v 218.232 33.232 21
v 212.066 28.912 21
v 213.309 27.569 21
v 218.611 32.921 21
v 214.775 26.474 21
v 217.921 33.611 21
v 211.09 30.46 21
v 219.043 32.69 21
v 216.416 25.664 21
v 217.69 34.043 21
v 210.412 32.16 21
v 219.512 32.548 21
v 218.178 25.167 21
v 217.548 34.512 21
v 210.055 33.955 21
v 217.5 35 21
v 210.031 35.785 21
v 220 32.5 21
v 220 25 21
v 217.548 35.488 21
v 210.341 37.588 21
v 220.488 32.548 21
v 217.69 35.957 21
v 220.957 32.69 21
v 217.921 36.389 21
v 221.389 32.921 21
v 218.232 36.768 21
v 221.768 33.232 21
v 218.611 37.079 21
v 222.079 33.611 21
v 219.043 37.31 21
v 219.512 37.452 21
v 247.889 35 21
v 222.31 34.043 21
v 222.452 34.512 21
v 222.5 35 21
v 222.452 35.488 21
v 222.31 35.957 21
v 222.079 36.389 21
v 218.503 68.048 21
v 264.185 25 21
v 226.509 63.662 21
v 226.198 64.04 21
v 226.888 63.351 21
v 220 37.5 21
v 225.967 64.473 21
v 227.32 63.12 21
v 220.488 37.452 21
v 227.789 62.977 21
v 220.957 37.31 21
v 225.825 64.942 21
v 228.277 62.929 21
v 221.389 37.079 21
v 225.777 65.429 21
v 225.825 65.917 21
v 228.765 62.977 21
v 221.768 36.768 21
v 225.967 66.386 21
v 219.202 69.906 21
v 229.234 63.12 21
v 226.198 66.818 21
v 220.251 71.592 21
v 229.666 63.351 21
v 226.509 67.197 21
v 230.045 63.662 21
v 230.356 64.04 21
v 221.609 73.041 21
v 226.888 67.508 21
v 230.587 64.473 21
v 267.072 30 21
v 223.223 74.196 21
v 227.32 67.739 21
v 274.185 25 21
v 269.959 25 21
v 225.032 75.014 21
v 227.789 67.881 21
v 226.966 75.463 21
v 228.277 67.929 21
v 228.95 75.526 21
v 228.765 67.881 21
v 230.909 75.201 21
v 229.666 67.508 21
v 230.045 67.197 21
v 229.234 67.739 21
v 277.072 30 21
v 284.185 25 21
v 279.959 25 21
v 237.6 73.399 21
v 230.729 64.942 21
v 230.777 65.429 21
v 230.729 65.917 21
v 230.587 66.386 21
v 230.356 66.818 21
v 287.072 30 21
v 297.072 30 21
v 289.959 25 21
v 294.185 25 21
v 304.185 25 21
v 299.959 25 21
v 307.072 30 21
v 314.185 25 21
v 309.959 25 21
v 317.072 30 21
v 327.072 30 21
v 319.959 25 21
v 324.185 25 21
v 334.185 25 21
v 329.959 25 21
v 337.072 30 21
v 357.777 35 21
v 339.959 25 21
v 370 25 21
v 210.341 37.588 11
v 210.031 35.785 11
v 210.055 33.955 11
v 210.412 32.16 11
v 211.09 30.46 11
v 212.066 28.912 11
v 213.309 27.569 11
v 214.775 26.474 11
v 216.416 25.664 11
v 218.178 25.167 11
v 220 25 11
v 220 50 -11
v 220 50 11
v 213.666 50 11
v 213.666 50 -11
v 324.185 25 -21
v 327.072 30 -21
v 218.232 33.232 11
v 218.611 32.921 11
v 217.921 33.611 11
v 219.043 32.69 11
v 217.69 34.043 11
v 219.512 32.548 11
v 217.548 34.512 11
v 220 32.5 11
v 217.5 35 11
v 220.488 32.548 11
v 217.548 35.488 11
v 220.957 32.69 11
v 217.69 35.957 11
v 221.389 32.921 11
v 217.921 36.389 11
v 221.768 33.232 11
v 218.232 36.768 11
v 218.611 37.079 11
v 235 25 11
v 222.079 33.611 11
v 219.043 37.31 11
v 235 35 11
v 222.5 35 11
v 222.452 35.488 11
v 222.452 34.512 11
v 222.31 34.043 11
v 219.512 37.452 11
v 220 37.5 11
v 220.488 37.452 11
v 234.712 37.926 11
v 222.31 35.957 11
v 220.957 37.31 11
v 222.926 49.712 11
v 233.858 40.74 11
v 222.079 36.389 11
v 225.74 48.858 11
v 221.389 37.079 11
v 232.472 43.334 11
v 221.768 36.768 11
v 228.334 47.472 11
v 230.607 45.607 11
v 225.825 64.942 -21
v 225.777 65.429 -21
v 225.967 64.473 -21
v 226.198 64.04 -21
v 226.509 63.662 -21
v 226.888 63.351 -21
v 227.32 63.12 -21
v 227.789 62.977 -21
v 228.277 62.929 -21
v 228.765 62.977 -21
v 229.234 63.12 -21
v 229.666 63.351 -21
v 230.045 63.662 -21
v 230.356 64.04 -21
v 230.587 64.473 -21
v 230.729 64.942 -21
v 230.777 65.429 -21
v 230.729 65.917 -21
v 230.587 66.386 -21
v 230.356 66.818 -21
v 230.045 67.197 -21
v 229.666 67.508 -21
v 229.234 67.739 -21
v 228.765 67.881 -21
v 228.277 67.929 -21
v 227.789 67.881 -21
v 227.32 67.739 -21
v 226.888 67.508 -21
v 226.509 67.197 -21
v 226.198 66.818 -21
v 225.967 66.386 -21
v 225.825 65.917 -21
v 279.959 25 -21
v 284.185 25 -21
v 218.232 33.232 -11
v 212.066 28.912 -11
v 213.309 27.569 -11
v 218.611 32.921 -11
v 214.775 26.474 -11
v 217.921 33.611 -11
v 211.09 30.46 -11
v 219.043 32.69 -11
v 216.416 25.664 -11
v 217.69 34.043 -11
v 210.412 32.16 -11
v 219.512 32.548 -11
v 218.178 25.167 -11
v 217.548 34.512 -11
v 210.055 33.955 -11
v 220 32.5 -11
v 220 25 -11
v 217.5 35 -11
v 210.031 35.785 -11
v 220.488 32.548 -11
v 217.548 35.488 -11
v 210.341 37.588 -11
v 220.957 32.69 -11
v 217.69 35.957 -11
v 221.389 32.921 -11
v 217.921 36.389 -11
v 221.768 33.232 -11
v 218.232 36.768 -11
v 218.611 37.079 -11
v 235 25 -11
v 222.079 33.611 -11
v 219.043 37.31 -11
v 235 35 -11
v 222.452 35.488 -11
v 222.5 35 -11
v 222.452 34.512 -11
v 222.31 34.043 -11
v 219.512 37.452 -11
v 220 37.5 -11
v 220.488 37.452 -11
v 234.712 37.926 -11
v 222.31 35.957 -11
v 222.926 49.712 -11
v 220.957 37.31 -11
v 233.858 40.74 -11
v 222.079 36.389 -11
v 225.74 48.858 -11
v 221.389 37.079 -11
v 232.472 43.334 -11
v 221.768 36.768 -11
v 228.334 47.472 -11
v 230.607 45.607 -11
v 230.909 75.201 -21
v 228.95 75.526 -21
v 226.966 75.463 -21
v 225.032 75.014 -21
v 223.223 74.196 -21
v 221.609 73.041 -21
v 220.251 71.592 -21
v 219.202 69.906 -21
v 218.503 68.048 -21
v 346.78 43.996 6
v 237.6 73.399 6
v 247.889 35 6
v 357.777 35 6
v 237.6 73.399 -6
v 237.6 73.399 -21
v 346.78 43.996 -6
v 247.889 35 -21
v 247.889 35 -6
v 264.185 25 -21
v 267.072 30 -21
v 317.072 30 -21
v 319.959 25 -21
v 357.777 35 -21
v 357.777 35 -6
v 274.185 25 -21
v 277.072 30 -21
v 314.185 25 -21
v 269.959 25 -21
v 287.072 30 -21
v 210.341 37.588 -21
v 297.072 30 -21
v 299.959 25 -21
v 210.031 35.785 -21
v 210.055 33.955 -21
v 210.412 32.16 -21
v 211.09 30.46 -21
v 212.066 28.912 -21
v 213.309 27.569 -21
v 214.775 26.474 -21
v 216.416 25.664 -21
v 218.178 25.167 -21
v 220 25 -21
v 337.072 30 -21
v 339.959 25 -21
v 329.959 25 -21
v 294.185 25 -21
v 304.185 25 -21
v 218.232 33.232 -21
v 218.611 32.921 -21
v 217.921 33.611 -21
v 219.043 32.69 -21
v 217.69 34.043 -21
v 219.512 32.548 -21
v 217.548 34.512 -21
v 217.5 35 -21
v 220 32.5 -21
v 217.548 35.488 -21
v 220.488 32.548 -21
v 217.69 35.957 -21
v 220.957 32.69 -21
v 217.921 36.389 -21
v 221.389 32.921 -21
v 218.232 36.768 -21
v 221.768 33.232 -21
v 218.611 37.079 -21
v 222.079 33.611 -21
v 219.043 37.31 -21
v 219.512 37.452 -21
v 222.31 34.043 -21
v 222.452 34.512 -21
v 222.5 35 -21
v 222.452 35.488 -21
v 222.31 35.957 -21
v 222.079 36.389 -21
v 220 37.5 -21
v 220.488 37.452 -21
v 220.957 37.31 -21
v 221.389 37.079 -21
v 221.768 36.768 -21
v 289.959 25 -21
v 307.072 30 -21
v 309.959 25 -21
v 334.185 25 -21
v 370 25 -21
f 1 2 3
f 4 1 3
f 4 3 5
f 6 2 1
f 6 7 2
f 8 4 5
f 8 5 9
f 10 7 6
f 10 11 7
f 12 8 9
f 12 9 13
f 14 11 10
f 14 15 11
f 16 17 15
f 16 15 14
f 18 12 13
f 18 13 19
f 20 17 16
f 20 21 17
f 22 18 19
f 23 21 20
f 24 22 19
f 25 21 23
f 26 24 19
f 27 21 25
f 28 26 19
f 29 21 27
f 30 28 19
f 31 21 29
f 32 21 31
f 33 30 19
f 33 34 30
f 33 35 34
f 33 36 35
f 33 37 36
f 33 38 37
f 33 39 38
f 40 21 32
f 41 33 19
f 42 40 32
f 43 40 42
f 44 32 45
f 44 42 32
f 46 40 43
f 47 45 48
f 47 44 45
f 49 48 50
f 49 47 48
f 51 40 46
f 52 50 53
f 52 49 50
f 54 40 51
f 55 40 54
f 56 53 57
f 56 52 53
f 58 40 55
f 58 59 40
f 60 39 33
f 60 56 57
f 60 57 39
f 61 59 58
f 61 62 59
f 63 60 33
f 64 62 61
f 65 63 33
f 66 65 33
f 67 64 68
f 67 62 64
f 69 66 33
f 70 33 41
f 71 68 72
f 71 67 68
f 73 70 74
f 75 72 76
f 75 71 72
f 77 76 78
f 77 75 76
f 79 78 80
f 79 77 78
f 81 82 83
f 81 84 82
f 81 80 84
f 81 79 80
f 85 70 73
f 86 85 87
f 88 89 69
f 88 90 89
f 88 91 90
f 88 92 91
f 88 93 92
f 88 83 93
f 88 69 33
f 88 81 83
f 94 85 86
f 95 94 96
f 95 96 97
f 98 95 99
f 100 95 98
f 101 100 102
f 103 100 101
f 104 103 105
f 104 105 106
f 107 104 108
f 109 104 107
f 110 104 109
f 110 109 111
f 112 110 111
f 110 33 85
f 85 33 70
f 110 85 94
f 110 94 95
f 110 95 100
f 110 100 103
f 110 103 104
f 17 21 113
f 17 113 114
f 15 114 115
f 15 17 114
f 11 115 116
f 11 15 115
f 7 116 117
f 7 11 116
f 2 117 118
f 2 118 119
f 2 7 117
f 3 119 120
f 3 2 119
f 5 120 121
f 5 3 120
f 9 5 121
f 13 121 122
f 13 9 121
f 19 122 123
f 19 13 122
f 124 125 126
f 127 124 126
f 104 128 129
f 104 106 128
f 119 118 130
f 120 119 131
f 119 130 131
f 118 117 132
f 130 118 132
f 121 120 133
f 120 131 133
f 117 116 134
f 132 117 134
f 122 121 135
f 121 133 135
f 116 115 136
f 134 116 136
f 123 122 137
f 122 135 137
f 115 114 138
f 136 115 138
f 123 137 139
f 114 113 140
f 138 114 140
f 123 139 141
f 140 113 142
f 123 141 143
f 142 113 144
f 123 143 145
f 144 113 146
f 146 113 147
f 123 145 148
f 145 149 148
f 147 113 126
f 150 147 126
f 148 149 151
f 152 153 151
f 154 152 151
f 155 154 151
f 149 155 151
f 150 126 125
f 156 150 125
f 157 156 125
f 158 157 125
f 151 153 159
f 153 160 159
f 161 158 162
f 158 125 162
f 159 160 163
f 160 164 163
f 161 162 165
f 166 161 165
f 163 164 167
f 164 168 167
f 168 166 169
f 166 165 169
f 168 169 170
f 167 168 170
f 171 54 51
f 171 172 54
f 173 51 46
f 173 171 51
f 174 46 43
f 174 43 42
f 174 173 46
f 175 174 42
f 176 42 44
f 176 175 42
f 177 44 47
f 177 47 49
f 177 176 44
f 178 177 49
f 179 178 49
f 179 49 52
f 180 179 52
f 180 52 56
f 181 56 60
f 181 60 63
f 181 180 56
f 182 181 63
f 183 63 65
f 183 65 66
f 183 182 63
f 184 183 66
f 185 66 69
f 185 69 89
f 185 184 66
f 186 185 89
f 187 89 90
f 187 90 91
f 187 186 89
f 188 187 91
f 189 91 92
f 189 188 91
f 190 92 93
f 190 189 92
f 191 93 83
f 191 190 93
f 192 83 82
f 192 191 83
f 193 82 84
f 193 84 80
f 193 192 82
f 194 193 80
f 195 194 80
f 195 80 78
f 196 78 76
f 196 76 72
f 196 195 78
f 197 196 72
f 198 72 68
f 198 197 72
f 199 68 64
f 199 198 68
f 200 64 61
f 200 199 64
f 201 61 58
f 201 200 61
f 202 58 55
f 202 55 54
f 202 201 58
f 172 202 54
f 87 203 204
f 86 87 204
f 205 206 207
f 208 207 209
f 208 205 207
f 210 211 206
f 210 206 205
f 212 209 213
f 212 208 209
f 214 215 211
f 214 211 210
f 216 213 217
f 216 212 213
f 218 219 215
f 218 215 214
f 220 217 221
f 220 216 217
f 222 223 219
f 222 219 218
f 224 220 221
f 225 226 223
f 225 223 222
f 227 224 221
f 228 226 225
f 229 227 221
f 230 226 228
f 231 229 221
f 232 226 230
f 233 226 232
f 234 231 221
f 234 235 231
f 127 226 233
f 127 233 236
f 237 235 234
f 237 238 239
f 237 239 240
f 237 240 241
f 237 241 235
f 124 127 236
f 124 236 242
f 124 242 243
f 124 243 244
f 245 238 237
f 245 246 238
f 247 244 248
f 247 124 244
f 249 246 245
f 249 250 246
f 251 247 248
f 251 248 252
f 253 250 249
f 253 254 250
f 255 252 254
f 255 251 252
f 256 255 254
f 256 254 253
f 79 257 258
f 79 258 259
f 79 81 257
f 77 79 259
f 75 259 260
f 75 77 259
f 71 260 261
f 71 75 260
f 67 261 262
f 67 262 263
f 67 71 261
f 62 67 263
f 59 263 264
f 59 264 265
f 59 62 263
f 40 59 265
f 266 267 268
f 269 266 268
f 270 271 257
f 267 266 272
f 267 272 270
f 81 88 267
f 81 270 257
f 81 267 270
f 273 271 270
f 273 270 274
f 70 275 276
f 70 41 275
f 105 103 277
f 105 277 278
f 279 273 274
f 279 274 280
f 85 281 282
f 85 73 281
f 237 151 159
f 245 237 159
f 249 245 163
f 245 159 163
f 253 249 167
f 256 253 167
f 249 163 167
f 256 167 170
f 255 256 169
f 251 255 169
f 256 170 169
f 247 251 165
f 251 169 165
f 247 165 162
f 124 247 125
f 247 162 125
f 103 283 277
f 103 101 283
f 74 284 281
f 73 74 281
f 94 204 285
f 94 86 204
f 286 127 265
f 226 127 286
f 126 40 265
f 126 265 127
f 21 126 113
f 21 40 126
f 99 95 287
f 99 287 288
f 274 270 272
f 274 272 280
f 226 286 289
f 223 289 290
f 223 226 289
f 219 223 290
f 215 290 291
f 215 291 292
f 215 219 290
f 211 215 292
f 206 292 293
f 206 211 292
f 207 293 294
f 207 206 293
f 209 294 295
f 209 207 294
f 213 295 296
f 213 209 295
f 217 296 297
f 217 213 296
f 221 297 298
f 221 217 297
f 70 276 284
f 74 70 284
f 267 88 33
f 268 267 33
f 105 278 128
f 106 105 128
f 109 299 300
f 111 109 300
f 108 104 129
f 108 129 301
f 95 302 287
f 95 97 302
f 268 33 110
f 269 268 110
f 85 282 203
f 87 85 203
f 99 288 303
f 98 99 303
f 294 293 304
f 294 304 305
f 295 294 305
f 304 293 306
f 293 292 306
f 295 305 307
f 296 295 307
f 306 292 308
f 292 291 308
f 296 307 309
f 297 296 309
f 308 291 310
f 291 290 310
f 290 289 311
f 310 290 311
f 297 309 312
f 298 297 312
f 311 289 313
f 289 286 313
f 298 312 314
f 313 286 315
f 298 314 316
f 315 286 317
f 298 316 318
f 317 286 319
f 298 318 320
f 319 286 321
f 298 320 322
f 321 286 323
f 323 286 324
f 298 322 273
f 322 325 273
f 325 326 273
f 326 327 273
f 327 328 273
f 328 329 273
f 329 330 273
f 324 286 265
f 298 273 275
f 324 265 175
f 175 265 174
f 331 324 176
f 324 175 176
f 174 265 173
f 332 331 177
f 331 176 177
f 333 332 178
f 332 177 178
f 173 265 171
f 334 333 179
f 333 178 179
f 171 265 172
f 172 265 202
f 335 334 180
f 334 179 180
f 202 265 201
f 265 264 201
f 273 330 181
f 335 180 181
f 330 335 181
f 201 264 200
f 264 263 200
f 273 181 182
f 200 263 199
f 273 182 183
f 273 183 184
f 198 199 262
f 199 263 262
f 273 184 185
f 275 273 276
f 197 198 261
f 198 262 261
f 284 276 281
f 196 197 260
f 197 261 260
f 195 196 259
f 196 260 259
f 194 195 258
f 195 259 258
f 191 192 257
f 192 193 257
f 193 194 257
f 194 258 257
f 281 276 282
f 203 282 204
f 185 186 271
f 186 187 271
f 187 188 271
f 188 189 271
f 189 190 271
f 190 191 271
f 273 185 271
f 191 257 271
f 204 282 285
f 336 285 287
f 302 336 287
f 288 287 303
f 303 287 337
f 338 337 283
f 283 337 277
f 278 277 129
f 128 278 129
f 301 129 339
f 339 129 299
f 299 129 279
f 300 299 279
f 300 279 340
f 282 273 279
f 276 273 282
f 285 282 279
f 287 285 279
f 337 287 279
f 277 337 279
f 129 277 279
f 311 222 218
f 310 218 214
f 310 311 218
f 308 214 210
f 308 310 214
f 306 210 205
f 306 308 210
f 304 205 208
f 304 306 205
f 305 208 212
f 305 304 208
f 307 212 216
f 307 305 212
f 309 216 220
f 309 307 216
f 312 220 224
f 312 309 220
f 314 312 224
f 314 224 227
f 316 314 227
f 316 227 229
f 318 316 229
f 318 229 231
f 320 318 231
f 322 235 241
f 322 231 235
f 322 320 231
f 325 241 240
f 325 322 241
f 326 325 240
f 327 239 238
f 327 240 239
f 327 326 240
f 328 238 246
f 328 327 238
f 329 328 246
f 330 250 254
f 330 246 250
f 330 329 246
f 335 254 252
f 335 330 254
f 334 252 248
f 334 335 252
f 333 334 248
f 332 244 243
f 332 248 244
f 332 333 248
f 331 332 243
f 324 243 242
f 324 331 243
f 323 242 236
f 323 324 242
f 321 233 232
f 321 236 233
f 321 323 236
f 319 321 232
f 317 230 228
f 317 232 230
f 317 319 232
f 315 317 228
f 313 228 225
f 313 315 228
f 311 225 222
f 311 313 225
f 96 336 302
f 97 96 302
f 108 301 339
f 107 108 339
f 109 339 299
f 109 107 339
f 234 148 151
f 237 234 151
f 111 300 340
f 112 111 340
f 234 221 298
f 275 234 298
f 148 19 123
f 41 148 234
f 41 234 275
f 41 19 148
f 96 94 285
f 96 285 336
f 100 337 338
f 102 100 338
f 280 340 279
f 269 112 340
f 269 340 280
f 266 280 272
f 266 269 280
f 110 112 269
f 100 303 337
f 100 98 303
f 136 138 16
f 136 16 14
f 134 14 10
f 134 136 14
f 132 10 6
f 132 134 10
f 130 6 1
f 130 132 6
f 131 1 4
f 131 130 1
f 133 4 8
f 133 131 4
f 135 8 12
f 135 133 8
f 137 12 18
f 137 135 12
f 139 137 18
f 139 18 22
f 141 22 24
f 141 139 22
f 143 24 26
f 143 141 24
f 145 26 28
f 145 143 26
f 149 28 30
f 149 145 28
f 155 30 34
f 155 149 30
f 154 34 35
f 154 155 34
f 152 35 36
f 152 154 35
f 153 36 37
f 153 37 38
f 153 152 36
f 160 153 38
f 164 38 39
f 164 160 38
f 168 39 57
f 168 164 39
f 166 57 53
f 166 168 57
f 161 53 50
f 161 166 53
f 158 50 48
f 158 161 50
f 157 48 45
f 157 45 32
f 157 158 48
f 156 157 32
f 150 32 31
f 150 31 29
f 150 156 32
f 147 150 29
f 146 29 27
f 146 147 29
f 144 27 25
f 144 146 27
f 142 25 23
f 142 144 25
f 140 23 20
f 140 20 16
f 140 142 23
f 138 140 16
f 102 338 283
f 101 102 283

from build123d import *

# Parameters (mm, degrees)
SKETCH_1_R             = 2.5
EXTRUDE_1_DEPTH        = 21
CUT_EXTRUDE_1_DEPTH    = 11
CUT_EXTRUDE_2_DEPTH    = 15
CUT_EXTRUDE_3_DEPTH    = 25
PATTERN_LINEAR_1_COUNT = 8
PATTERN_LINEAR_1_PITCH = 10


with BuildPart() as part:
    # 草图1 → 凸台-拉伸1 (new, symmetric)
    with BuildSketch(Plane.XY):
        with BuildLine():
            Line((218.502541787, 68.048442919), (210.340741737, 37.588190451))
            ThreePointArc((210.340741737, 37.588190451), (212.066466597, 28.91238571), (220, 25))
            Line((220, 25), (358.547941324, 25))
            Line((358.547941324, 25), (370, 25))
            Line((370, 25), (346.78040334, 43.996060933))
            Line((346.78040334, 43.996060933), (230.908606215, 75.200654039))
            ThreePointArc((230.908606215, 75.200654039), (223.222977943, 74.196224157), (218.502541787, 68.048442919))
        make_face()
        with Locations(Location((220, 35, 0), (0, 0, 180))):
            Circle(SKETCH_1_R, mode=Mode.SUBTRACT)
        with Locations(Location((228.27716468, 65.429340608, 0), (0, 0, 180))):
            Circle(SKETCH_1_R, mode=Mode.SUBTRACT)
    extrude(amount=EXTRUDE_1_DEPTH, both=True)

    # 草图2 → 切除-拉伸1 (cut, symmetric)
    with BuildSketch(Plane.XY):
        with BuildLine():
            Line((235, 20), (235, 35))
            ThreePointArc((235, 35), (230.606601718, 45.606601718), (220, 50))
            Line((220, 50), (205, 50))
            Line((205, 50), (205.078251443, 33.469830071))
            Line((205.078251443, 33.469830071), (205.078251443, 20))
            Line((205.078251443, 20), (235, 20))
        make_face()
    extrude(amount=CUT_EXTRUDE_1_DEPTH, both=True, mode=Mode.SUBTRACT)

    # 草图3 → 切除-拉伸2 (cut)
    with BuildSketch(Plane.XY.offset(21)):
        Polygon((237.599806566, 73.398695413), (247.888705992, 35), (366.823980308, 35), (338.386105999, 70.333701244), align=None)
    cut_extrude_2 = extrude(amount=-CUT_EXTRUDE_2_DEPTH, mode=Mode.SUBTRACT)

    # 镜向1: 切除-拉伸2 across plane
    add(cut_extrude_2.mirror(Plane.XY), mode=Mode.SUBTRACT)

    # 草图4 → 切除-拉伸3 (cut, symmetric)
    with BuildSketch(Plane.XY):
        Polygon((262.071941238, 21.339745962), (267.071941238, 30), (272.071941238, 21.339745962), align=None)
    cut_extrude_3 = extrude(amount=CUT_EXTRUDE_3_DEPTH, both=True, mode=Mode.SUBTRACT)

    # 阵列(线性)1: 切除-拉伸3 ×8
    with Locations(*[(i * PATTERN_LINEAR_1_PITCH, 0, 0) for i in range(1, PATTERN_LINEAR_1_COUNT)]):
        add(cut_extrude_3, mode=Mode.SUBTRACT)


solid = part.part
